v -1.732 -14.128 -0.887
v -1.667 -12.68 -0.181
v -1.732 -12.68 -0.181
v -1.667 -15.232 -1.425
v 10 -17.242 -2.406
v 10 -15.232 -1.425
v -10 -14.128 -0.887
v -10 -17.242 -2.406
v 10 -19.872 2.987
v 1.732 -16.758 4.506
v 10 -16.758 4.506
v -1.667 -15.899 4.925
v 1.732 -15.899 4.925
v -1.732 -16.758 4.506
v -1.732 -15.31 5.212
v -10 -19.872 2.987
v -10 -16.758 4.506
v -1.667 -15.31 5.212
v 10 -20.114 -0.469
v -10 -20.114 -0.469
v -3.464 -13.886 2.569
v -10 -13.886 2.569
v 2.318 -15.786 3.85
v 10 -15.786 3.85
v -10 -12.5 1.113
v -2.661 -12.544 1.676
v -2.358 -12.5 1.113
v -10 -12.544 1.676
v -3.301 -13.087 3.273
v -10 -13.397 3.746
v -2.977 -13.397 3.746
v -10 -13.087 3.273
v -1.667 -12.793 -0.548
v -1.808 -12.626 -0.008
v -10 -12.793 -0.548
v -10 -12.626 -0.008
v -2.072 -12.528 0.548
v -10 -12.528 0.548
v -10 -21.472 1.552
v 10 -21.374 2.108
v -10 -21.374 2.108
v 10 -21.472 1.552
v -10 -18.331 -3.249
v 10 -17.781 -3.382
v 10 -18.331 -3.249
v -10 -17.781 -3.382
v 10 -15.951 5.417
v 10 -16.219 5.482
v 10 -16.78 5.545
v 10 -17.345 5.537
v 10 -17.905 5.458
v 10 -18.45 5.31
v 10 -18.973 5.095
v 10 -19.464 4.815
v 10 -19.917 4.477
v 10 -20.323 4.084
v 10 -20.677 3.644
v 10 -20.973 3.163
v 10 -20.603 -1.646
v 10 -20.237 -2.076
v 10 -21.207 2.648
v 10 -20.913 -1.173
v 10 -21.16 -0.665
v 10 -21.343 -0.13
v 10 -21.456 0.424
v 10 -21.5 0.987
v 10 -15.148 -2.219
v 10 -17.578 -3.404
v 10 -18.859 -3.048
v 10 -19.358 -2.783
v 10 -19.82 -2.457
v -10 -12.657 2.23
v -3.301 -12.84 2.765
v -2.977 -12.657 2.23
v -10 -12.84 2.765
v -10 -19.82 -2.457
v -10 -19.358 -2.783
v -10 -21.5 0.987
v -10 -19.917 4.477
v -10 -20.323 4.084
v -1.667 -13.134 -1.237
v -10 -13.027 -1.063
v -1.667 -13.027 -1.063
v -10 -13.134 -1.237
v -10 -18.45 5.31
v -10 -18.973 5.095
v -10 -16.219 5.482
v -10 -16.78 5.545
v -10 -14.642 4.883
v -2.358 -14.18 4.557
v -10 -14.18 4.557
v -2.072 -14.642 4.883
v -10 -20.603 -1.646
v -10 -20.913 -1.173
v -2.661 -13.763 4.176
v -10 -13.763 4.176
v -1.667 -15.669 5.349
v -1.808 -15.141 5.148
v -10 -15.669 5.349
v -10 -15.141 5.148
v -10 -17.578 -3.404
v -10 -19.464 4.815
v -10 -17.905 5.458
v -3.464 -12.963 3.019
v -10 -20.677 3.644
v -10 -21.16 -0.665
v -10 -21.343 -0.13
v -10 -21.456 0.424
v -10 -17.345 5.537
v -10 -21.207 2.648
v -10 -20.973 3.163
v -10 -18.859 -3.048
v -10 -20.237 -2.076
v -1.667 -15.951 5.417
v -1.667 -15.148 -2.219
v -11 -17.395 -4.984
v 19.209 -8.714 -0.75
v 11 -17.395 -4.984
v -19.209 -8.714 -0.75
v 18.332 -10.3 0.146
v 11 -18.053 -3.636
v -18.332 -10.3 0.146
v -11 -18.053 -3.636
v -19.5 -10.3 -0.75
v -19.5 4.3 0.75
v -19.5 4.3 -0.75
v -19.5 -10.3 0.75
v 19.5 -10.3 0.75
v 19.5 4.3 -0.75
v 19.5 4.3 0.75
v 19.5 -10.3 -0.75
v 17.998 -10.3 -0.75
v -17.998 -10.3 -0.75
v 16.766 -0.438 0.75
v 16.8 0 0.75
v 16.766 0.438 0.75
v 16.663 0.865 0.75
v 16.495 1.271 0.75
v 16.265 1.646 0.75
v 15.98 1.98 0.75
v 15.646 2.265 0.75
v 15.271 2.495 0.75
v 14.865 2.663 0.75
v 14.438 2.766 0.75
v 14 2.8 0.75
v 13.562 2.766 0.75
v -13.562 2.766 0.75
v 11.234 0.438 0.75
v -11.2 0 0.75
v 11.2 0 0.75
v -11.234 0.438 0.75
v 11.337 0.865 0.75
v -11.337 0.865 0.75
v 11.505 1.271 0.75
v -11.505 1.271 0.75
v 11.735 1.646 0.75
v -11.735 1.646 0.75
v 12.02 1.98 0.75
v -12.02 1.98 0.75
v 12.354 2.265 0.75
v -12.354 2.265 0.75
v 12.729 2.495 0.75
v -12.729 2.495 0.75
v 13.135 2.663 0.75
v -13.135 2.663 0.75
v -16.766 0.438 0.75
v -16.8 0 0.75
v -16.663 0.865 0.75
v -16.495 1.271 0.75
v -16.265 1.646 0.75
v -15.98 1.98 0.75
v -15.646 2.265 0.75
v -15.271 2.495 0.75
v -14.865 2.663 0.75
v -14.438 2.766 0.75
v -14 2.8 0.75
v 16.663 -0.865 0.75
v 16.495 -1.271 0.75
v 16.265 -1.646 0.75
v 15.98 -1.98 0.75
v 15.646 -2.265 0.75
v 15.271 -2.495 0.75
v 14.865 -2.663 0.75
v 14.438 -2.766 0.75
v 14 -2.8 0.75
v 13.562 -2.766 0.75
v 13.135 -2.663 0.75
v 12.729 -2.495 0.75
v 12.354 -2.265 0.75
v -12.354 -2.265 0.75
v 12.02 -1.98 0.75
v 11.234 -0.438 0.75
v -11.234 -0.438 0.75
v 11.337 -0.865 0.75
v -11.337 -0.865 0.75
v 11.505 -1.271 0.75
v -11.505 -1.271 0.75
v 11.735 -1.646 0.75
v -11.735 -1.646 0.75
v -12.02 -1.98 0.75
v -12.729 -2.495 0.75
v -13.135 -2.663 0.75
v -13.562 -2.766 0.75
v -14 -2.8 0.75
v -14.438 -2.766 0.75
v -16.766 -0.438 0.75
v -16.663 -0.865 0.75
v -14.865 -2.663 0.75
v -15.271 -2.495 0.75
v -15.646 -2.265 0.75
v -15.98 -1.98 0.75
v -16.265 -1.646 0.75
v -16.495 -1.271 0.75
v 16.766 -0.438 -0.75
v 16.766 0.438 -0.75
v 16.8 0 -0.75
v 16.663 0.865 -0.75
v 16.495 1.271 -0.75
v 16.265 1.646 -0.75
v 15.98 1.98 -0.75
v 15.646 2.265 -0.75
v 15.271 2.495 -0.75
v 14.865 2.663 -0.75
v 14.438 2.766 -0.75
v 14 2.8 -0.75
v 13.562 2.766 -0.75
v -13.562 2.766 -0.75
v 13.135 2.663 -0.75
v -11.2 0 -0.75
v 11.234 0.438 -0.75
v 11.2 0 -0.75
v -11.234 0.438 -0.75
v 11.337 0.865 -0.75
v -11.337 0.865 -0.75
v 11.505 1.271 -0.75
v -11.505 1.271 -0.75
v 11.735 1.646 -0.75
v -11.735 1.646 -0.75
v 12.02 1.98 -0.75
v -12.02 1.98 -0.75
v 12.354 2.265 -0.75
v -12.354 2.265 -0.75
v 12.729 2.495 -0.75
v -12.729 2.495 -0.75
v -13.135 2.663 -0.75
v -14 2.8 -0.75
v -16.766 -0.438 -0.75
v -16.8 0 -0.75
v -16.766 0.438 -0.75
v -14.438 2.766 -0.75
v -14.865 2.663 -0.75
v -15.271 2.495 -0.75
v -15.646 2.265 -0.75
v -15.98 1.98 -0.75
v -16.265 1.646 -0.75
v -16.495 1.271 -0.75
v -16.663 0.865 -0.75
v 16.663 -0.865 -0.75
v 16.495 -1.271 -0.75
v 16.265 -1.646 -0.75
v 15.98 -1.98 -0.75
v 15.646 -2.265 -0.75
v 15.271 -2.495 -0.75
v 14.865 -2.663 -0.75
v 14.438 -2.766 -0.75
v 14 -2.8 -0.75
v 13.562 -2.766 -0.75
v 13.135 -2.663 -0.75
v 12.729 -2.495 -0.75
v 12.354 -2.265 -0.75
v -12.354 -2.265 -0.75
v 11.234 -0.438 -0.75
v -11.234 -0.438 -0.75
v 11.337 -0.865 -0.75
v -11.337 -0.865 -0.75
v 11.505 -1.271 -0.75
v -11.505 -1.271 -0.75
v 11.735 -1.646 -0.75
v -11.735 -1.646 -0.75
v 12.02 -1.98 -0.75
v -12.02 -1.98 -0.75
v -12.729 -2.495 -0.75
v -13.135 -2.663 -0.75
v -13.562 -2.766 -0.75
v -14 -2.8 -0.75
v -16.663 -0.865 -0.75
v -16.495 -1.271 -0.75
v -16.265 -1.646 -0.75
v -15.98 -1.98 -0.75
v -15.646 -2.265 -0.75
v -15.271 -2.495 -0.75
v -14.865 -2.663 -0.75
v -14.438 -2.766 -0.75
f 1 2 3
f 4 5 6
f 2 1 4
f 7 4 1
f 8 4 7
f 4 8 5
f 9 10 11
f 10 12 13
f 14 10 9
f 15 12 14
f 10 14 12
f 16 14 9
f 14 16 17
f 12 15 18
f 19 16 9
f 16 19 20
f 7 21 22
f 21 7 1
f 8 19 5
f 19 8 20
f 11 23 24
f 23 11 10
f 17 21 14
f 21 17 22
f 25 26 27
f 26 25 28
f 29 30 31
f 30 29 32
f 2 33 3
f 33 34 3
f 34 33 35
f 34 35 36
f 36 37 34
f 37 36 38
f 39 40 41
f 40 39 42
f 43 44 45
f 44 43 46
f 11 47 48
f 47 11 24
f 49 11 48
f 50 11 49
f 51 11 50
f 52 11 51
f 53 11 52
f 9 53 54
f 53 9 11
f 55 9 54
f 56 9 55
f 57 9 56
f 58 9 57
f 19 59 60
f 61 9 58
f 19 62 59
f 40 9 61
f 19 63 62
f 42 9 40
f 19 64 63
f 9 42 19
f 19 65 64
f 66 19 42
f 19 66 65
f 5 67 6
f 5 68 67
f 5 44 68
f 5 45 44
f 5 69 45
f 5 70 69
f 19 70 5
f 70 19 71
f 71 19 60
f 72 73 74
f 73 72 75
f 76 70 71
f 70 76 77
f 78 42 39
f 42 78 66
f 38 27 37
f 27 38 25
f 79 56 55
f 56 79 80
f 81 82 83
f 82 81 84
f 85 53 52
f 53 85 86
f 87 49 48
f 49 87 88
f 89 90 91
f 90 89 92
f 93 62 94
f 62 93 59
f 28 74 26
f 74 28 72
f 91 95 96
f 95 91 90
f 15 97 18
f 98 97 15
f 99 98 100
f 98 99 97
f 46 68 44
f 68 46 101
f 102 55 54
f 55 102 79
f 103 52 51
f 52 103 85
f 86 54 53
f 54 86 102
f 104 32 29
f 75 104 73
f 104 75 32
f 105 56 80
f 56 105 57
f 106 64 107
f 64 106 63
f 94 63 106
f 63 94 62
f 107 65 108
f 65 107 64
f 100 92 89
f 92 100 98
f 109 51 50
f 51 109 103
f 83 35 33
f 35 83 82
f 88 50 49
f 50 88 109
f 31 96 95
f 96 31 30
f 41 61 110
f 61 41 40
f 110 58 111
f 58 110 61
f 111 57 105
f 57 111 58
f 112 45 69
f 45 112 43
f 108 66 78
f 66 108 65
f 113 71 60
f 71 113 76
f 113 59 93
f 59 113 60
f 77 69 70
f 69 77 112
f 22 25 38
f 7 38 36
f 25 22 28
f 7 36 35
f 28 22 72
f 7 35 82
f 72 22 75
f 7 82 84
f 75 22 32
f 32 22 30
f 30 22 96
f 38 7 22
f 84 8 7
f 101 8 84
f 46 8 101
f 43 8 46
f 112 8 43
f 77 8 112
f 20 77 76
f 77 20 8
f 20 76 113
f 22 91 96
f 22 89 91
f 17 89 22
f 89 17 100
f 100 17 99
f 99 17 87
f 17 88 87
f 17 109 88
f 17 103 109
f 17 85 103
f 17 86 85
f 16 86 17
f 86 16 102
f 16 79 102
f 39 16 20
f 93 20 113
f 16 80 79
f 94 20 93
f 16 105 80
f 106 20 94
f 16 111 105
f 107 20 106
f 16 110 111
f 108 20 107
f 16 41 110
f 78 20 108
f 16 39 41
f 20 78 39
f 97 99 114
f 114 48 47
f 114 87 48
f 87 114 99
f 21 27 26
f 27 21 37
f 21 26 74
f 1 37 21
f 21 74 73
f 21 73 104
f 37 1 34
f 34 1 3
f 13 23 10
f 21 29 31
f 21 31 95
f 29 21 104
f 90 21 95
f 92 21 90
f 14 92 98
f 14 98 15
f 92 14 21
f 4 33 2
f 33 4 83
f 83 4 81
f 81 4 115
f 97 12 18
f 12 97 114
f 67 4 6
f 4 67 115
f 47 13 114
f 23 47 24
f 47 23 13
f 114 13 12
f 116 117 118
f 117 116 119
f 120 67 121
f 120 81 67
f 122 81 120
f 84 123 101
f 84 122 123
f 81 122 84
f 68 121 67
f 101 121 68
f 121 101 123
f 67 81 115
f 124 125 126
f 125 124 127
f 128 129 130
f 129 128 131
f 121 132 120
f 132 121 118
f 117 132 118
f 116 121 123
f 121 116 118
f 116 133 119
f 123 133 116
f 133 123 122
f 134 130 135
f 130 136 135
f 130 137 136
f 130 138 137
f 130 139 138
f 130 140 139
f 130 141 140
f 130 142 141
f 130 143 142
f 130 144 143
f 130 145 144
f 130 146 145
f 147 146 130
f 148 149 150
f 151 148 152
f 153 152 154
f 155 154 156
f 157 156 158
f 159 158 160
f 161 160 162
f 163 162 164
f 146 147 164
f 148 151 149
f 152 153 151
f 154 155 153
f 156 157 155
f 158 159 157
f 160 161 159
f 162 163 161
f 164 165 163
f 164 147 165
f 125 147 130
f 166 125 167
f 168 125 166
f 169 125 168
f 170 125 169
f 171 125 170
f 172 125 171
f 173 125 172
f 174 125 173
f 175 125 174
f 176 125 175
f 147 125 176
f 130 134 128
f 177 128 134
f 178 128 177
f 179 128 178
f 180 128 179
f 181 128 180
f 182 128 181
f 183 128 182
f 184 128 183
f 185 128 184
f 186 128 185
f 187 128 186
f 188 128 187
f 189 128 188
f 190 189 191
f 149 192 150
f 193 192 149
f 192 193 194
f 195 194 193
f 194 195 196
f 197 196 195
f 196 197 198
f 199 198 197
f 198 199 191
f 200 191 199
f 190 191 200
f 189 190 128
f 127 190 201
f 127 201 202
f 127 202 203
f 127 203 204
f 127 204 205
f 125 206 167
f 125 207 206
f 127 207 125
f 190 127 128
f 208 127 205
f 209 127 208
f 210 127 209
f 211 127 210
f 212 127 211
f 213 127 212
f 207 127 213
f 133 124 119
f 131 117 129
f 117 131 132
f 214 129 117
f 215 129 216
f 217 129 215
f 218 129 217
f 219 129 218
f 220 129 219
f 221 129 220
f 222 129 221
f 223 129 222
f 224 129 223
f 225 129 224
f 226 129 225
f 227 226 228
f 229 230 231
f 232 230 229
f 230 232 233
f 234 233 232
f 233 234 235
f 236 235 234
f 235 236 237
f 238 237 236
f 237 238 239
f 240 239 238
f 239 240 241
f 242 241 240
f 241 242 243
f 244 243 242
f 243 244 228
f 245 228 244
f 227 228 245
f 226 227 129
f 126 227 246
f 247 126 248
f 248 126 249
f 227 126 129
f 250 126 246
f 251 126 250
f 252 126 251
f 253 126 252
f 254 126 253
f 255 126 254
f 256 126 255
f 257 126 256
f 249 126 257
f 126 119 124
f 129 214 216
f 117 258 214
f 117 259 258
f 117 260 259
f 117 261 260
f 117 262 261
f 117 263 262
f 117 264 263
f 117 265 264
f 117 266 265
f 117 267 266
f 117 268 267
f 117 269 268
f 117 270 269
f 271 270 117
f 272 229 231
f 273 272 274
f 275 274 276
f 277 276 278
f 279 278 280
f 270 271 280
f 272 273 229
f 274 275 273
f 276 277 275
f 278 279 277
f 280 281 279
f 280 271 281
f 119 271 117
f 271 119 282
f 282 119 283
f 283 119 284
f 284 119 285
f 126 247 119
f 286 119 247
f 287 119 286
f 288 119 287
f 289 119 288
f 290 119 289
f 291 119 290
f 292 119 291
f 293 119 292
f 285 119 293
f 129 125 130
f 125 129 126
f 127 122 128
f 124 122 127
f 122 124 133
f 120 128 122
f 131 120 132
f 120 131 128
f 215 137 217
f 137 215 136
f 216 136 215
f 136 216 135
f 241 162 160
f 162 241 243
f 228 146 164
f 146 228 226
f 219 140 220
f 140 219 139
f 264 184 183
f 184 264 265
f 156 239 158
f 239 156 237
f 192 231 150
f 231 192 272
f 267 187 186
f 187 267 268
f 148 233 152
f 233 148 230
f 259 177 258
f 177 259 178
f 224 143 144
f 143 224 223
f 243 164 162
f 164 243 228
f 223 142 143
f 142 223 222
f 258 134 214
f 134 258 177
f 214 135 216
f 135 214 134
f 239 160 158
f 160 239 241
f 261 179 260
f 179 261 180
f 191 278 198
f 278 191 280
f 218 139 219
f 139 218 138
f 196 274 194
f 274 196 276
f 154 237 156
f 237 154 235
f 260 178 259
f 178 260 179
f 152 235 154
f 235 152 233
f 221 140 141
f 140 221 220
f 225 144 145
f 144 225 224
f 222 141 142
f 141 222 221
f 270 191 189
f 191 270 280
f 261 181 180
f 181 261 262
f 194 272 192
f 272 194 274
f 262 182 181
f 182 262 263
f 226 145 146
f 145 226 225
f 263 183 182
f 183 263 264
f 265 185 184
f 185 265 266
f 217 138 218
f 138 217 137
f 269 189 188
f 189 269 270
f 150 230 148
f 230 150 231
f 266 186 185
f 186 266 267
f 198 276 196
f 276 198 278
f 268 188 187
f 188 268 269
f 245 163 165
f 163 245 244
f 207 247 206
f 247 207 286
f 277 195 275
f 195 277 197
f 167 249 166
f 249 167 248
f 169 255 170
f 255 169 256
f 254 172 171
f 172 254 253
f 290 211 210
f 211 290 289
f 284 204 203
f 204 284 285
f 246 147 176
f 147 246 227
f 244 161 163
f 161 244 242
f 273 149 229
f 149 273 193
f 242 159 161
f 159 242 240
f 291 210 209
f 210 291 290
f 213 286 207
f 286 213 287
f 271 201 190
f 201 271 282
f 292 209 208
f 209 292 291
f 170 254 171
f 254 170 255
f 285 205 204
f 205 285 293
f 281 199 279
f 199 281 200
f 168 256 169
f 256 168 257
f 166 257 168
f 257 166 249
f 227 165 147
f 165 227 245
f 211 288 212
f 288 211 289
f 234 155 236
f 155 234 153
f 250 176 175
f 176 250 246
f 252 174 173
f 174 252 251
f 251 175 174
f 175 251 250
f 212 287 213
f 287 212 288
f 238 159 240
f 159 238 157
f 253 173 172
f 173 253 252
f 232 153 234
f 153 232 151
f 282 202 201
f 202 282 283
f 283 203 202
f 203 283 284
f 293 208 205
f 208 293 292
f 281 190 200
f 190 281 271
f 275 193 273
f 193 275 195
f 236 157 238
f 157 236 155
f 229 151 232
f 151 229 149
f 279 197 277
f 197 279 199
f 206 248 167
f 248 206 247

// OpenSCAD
// file: trapeze.scad
module trapeze(base, top, height, lentgth) {
    linear_extrude(height = height, center=true)
        hull() {
            square([base,0.0001], center=true);
            mv(0,lentgth,0)
                square([top,0.0001], center=true);
        }
}
// file: hexagone.scad
function cot(x)=1/tan(x);

module Hexagone(cle,h)
{
	angle = 360/6;		// 6 pans
	cote = cle * cot(angle);
	echo(angle, cot(angle), cote);
	echo(acos(.6));

	union()
	{
		rotate([0,0,0])
			cube([cle,cote,h],center=true);
		rotate([0,0,angle])
			cube([cle,cote,h],center=true);
		rotate([0,0,2*angle])
			cube([cle,cote,h],center=true);
	}
}
// file: utils.scad
module part(name) {
    echo(len(search(name, PART)));
    if (PART == undef || PART == name) {
        children([0 : $children -1]);
    }
    else {
        if (PART_ONLY == undef) {
            %children([0 : $children -1]);
        }
    }
}

module partno(name, r=0,g=1,b=1) {
    if (PART_ONLY == undef) {
        color([r,g,b]) {
            if (PART == undef || PART == name) {
                %children([0 : $children -1]);
            }
            else {
                %children([0 : $children -1]);
            }
        }
    }
}

module kube(x,y,z) {
    cube([x,y,z], center=true);
}

module mv(x, y, z) {
    translate([x,y,z]) {
        children([0 : $children -1]);

   }
}

module rot(x, y, z) {
    rotate([x,y,z]) {
        children([0 : $children -1]);
   }
}

module rez(x, y, z) {
    scale([x,y,z]) {
        children([0 : $children]);
   }
}

module co(r,g,b) {
    color([r,g,b]) {
        children([0 : $children]);
   }
}

module trans() {
    %children();
}

module hash() {
    #children();
}

module fidt() {
    children(0);
    render(convexity = 2) difference() {
        trans()
        children(1);
        hash()
        children(0);
   }
}

module fid() {
    render(convexity = 2) difference() {
        children(1);
        children(0);
   }
}

module int() {
    render(convexity = 2) intersection() {
        children(0);
        children(1);
   }
}

module dif() {
    render(convexity = 2) difference() {
        children(0);
        children(1);
   }
}

module dift() {
    children(1);
    render(convexity = 2) difference() {
        trans()
        children(0);
        hash()
        children(1);
   }
}

module mirrot(x, y ,z) {
    children(0);
    rotate([x, y, z]) {
        children(0);
    }
}

module mirx() {
    children([0:$children-1]);
    mirror([1,0,0]) {
        children([0:$children-1]);
   }
}

module miry() {
    children([0:$children-1]);
    mirror([0,1,0]) {
        children([0:$children-1]);
   }
}

module mxm(dist) {
    mirx() mv(dist,0,0)
    children([0:$children-1]);
}

module mym(dist) {
    miry() mv(0,dist,0)
    children([0:$children-1]);
}

module mirz() {
    children([0:$children-1]);
    mirror([0,0,1]) {
        children([0:$children-1]);
   }
}

module dif3() {
    dif() {
        dif() {
            children(0);
            children(1);
        }
        children(2);
    }
}

module dif4() {
    dif() {
        dif3() {
            children(0);
            children(1);
            children(2);
        }
        children(3);
    }
}

function inch_mm(x) = x*25.4;

function mm_inch(x) = x/25.4;
// main file
include<utils.scad>
include<hexagone.scad>
include<trapeze.scad>

hexa_spacing=28;
hexa_height=30;
hexa_key=6;

antena_key=6;
antena_heigh=20;
antena_protlen=3;
antena_protdist=12;
antena_cylinder_stiffness=antena_key+3;

/*fid() {*/
    /*mirx() {*/
        /*mv(hexa_spacing/2,0,0) {*/
            /*Hexagone(hexa_key, hexa_height);*/
        /*}*/
    /*}*/
    /*union(){*/
        /*mv(0,-antena_protdist,0) {*/
            /*dif() {*/
                /*rot(0,90,0) {*/
                    /*fid() {*/
                        /*Hexagone(antena_key, antena_heigh+1);*/
                        /*cylinder(h=antena_heigh, d=antena_key+antena_protlen, $fn=50, center = true);*/
                    /*}*/
                /*}*/
                /*union() {*/
                    /*rot(-20,0,0)*/
                        /*mv(antena_heigh/2.4,(antena_key+antena_protlen)/2,0)*/
                        /*cube([antena_heigh,antena_key,antena_key*2], center=true);*/
                    /*mv(0,3,0)*/
                        /*rot(0,90,90)*/
                        /*Hexagone(6,5);*/
                /*}*/
            /*}*/

        /*}*/
        /*union() {*/
            /*mv(0,0.5,-antena_key/2-antena_protlen/4)*/
                /*cube([hexa_spacing+11,11,antena_protlen/2], center=true);*/

            /*mv(0,-antena_protdist-4,-antena_key/2-antena_protlen/4)*/
                /*trapeze(antena_heigh+2, hexa_spacing+11, antena_protlen/2, 10);*/
        /*}*/
    /*}*/
/*}*/

module prot_cylinder() {
    dif() {
        rot(0,90,0) {
            fid() {
                Hexagone(antena_key, antena_heigh+1);
                cylinder(h=antena_heigh, d=antena_cylinder_stiffness, $fn=50, center = true);
            }
        }
        union() {
            rot(-20,0,0)
                mv(antena_heigh/2.4,(antena_key+antena_protlen)/2,0)
                cube([antena_heigh,antena_key,antena_key*2], center=true);
            mv(0,3,0)
                rot(0,90,90)
                Hexagone(6,5);
        }
    }
}

mv(0,-antena_protdist-10/2, 1.05)
rot(26,0,0) {
    prot_cylinder();
    mv(0,-3,antena_cylinder_stiffness/-2)
        trapeze(antena_heigh+2, hexa_spacing+11, antena_protlen/2, 10);
}

/*cube([hexa_spacing+11,5.60+3,antena_protlen/2], center=true);*/
/*mv(0,antena_protdist/-2,0)*/
/*cube([hexa_spacing+11,-antena_protdist,antena_protlen/2], center=true);*/
dif() {
    union() {
        cube([hexa_spacing+11,5.60+3,antena_protlen/2], center=true);
        mv(0,(5.60+3)/-2,0)
            cube([hexa_spacing+11,antena_protdist,antena_protlen/2], center=true);
    }
    mirx()
        mv(hexa_spacing/2,0,0)
        cylinder(h=100, d=5.60, center=true, $fn=40);
}

/*vtx_holder_depth=2;*/
/*vtx_holder_diam=6;//? pas sur*/
/*vtx_holder_width=hexa_spacing;*/
/*vtx_holder_arm_multiplyer=1.5;*/

/*mv(0,0,10)*/
/*fid() {*/
    /*mirx() {*/
        /*mv(hexa_spacing/2,0,0) {*/
            /*Hexagone(hexa_key+0.1, hexa_height);*/
        /*}*/
    /*}*/

    /*union() {*/
        /*mirx() {*/
            /*mv(hexa_spacing/2,0,0) {*/
                /*Hexagone((hexa_key*vtx_holder_arm_multiplyer)+0.1, vtx_holder_diam*vtx_holder_arm_multiplyer);*/
            /*}*/
        /*}*/
        /*dif() {*/
            /*cube([vtx_holder_width, vtx_holder_depth, vtx_holder_diam*vtx_holder_arm_multiplyer], center=true);*/
            /*rot(90,0,0)*/
                /*cylinder(h=10,d=vtx_holder_diam, center=true);*/
        /*}*/
    /*}*/
/*}*/

/*rot(0,90,0)*/
/*#Hexagone(2, 28);*/
